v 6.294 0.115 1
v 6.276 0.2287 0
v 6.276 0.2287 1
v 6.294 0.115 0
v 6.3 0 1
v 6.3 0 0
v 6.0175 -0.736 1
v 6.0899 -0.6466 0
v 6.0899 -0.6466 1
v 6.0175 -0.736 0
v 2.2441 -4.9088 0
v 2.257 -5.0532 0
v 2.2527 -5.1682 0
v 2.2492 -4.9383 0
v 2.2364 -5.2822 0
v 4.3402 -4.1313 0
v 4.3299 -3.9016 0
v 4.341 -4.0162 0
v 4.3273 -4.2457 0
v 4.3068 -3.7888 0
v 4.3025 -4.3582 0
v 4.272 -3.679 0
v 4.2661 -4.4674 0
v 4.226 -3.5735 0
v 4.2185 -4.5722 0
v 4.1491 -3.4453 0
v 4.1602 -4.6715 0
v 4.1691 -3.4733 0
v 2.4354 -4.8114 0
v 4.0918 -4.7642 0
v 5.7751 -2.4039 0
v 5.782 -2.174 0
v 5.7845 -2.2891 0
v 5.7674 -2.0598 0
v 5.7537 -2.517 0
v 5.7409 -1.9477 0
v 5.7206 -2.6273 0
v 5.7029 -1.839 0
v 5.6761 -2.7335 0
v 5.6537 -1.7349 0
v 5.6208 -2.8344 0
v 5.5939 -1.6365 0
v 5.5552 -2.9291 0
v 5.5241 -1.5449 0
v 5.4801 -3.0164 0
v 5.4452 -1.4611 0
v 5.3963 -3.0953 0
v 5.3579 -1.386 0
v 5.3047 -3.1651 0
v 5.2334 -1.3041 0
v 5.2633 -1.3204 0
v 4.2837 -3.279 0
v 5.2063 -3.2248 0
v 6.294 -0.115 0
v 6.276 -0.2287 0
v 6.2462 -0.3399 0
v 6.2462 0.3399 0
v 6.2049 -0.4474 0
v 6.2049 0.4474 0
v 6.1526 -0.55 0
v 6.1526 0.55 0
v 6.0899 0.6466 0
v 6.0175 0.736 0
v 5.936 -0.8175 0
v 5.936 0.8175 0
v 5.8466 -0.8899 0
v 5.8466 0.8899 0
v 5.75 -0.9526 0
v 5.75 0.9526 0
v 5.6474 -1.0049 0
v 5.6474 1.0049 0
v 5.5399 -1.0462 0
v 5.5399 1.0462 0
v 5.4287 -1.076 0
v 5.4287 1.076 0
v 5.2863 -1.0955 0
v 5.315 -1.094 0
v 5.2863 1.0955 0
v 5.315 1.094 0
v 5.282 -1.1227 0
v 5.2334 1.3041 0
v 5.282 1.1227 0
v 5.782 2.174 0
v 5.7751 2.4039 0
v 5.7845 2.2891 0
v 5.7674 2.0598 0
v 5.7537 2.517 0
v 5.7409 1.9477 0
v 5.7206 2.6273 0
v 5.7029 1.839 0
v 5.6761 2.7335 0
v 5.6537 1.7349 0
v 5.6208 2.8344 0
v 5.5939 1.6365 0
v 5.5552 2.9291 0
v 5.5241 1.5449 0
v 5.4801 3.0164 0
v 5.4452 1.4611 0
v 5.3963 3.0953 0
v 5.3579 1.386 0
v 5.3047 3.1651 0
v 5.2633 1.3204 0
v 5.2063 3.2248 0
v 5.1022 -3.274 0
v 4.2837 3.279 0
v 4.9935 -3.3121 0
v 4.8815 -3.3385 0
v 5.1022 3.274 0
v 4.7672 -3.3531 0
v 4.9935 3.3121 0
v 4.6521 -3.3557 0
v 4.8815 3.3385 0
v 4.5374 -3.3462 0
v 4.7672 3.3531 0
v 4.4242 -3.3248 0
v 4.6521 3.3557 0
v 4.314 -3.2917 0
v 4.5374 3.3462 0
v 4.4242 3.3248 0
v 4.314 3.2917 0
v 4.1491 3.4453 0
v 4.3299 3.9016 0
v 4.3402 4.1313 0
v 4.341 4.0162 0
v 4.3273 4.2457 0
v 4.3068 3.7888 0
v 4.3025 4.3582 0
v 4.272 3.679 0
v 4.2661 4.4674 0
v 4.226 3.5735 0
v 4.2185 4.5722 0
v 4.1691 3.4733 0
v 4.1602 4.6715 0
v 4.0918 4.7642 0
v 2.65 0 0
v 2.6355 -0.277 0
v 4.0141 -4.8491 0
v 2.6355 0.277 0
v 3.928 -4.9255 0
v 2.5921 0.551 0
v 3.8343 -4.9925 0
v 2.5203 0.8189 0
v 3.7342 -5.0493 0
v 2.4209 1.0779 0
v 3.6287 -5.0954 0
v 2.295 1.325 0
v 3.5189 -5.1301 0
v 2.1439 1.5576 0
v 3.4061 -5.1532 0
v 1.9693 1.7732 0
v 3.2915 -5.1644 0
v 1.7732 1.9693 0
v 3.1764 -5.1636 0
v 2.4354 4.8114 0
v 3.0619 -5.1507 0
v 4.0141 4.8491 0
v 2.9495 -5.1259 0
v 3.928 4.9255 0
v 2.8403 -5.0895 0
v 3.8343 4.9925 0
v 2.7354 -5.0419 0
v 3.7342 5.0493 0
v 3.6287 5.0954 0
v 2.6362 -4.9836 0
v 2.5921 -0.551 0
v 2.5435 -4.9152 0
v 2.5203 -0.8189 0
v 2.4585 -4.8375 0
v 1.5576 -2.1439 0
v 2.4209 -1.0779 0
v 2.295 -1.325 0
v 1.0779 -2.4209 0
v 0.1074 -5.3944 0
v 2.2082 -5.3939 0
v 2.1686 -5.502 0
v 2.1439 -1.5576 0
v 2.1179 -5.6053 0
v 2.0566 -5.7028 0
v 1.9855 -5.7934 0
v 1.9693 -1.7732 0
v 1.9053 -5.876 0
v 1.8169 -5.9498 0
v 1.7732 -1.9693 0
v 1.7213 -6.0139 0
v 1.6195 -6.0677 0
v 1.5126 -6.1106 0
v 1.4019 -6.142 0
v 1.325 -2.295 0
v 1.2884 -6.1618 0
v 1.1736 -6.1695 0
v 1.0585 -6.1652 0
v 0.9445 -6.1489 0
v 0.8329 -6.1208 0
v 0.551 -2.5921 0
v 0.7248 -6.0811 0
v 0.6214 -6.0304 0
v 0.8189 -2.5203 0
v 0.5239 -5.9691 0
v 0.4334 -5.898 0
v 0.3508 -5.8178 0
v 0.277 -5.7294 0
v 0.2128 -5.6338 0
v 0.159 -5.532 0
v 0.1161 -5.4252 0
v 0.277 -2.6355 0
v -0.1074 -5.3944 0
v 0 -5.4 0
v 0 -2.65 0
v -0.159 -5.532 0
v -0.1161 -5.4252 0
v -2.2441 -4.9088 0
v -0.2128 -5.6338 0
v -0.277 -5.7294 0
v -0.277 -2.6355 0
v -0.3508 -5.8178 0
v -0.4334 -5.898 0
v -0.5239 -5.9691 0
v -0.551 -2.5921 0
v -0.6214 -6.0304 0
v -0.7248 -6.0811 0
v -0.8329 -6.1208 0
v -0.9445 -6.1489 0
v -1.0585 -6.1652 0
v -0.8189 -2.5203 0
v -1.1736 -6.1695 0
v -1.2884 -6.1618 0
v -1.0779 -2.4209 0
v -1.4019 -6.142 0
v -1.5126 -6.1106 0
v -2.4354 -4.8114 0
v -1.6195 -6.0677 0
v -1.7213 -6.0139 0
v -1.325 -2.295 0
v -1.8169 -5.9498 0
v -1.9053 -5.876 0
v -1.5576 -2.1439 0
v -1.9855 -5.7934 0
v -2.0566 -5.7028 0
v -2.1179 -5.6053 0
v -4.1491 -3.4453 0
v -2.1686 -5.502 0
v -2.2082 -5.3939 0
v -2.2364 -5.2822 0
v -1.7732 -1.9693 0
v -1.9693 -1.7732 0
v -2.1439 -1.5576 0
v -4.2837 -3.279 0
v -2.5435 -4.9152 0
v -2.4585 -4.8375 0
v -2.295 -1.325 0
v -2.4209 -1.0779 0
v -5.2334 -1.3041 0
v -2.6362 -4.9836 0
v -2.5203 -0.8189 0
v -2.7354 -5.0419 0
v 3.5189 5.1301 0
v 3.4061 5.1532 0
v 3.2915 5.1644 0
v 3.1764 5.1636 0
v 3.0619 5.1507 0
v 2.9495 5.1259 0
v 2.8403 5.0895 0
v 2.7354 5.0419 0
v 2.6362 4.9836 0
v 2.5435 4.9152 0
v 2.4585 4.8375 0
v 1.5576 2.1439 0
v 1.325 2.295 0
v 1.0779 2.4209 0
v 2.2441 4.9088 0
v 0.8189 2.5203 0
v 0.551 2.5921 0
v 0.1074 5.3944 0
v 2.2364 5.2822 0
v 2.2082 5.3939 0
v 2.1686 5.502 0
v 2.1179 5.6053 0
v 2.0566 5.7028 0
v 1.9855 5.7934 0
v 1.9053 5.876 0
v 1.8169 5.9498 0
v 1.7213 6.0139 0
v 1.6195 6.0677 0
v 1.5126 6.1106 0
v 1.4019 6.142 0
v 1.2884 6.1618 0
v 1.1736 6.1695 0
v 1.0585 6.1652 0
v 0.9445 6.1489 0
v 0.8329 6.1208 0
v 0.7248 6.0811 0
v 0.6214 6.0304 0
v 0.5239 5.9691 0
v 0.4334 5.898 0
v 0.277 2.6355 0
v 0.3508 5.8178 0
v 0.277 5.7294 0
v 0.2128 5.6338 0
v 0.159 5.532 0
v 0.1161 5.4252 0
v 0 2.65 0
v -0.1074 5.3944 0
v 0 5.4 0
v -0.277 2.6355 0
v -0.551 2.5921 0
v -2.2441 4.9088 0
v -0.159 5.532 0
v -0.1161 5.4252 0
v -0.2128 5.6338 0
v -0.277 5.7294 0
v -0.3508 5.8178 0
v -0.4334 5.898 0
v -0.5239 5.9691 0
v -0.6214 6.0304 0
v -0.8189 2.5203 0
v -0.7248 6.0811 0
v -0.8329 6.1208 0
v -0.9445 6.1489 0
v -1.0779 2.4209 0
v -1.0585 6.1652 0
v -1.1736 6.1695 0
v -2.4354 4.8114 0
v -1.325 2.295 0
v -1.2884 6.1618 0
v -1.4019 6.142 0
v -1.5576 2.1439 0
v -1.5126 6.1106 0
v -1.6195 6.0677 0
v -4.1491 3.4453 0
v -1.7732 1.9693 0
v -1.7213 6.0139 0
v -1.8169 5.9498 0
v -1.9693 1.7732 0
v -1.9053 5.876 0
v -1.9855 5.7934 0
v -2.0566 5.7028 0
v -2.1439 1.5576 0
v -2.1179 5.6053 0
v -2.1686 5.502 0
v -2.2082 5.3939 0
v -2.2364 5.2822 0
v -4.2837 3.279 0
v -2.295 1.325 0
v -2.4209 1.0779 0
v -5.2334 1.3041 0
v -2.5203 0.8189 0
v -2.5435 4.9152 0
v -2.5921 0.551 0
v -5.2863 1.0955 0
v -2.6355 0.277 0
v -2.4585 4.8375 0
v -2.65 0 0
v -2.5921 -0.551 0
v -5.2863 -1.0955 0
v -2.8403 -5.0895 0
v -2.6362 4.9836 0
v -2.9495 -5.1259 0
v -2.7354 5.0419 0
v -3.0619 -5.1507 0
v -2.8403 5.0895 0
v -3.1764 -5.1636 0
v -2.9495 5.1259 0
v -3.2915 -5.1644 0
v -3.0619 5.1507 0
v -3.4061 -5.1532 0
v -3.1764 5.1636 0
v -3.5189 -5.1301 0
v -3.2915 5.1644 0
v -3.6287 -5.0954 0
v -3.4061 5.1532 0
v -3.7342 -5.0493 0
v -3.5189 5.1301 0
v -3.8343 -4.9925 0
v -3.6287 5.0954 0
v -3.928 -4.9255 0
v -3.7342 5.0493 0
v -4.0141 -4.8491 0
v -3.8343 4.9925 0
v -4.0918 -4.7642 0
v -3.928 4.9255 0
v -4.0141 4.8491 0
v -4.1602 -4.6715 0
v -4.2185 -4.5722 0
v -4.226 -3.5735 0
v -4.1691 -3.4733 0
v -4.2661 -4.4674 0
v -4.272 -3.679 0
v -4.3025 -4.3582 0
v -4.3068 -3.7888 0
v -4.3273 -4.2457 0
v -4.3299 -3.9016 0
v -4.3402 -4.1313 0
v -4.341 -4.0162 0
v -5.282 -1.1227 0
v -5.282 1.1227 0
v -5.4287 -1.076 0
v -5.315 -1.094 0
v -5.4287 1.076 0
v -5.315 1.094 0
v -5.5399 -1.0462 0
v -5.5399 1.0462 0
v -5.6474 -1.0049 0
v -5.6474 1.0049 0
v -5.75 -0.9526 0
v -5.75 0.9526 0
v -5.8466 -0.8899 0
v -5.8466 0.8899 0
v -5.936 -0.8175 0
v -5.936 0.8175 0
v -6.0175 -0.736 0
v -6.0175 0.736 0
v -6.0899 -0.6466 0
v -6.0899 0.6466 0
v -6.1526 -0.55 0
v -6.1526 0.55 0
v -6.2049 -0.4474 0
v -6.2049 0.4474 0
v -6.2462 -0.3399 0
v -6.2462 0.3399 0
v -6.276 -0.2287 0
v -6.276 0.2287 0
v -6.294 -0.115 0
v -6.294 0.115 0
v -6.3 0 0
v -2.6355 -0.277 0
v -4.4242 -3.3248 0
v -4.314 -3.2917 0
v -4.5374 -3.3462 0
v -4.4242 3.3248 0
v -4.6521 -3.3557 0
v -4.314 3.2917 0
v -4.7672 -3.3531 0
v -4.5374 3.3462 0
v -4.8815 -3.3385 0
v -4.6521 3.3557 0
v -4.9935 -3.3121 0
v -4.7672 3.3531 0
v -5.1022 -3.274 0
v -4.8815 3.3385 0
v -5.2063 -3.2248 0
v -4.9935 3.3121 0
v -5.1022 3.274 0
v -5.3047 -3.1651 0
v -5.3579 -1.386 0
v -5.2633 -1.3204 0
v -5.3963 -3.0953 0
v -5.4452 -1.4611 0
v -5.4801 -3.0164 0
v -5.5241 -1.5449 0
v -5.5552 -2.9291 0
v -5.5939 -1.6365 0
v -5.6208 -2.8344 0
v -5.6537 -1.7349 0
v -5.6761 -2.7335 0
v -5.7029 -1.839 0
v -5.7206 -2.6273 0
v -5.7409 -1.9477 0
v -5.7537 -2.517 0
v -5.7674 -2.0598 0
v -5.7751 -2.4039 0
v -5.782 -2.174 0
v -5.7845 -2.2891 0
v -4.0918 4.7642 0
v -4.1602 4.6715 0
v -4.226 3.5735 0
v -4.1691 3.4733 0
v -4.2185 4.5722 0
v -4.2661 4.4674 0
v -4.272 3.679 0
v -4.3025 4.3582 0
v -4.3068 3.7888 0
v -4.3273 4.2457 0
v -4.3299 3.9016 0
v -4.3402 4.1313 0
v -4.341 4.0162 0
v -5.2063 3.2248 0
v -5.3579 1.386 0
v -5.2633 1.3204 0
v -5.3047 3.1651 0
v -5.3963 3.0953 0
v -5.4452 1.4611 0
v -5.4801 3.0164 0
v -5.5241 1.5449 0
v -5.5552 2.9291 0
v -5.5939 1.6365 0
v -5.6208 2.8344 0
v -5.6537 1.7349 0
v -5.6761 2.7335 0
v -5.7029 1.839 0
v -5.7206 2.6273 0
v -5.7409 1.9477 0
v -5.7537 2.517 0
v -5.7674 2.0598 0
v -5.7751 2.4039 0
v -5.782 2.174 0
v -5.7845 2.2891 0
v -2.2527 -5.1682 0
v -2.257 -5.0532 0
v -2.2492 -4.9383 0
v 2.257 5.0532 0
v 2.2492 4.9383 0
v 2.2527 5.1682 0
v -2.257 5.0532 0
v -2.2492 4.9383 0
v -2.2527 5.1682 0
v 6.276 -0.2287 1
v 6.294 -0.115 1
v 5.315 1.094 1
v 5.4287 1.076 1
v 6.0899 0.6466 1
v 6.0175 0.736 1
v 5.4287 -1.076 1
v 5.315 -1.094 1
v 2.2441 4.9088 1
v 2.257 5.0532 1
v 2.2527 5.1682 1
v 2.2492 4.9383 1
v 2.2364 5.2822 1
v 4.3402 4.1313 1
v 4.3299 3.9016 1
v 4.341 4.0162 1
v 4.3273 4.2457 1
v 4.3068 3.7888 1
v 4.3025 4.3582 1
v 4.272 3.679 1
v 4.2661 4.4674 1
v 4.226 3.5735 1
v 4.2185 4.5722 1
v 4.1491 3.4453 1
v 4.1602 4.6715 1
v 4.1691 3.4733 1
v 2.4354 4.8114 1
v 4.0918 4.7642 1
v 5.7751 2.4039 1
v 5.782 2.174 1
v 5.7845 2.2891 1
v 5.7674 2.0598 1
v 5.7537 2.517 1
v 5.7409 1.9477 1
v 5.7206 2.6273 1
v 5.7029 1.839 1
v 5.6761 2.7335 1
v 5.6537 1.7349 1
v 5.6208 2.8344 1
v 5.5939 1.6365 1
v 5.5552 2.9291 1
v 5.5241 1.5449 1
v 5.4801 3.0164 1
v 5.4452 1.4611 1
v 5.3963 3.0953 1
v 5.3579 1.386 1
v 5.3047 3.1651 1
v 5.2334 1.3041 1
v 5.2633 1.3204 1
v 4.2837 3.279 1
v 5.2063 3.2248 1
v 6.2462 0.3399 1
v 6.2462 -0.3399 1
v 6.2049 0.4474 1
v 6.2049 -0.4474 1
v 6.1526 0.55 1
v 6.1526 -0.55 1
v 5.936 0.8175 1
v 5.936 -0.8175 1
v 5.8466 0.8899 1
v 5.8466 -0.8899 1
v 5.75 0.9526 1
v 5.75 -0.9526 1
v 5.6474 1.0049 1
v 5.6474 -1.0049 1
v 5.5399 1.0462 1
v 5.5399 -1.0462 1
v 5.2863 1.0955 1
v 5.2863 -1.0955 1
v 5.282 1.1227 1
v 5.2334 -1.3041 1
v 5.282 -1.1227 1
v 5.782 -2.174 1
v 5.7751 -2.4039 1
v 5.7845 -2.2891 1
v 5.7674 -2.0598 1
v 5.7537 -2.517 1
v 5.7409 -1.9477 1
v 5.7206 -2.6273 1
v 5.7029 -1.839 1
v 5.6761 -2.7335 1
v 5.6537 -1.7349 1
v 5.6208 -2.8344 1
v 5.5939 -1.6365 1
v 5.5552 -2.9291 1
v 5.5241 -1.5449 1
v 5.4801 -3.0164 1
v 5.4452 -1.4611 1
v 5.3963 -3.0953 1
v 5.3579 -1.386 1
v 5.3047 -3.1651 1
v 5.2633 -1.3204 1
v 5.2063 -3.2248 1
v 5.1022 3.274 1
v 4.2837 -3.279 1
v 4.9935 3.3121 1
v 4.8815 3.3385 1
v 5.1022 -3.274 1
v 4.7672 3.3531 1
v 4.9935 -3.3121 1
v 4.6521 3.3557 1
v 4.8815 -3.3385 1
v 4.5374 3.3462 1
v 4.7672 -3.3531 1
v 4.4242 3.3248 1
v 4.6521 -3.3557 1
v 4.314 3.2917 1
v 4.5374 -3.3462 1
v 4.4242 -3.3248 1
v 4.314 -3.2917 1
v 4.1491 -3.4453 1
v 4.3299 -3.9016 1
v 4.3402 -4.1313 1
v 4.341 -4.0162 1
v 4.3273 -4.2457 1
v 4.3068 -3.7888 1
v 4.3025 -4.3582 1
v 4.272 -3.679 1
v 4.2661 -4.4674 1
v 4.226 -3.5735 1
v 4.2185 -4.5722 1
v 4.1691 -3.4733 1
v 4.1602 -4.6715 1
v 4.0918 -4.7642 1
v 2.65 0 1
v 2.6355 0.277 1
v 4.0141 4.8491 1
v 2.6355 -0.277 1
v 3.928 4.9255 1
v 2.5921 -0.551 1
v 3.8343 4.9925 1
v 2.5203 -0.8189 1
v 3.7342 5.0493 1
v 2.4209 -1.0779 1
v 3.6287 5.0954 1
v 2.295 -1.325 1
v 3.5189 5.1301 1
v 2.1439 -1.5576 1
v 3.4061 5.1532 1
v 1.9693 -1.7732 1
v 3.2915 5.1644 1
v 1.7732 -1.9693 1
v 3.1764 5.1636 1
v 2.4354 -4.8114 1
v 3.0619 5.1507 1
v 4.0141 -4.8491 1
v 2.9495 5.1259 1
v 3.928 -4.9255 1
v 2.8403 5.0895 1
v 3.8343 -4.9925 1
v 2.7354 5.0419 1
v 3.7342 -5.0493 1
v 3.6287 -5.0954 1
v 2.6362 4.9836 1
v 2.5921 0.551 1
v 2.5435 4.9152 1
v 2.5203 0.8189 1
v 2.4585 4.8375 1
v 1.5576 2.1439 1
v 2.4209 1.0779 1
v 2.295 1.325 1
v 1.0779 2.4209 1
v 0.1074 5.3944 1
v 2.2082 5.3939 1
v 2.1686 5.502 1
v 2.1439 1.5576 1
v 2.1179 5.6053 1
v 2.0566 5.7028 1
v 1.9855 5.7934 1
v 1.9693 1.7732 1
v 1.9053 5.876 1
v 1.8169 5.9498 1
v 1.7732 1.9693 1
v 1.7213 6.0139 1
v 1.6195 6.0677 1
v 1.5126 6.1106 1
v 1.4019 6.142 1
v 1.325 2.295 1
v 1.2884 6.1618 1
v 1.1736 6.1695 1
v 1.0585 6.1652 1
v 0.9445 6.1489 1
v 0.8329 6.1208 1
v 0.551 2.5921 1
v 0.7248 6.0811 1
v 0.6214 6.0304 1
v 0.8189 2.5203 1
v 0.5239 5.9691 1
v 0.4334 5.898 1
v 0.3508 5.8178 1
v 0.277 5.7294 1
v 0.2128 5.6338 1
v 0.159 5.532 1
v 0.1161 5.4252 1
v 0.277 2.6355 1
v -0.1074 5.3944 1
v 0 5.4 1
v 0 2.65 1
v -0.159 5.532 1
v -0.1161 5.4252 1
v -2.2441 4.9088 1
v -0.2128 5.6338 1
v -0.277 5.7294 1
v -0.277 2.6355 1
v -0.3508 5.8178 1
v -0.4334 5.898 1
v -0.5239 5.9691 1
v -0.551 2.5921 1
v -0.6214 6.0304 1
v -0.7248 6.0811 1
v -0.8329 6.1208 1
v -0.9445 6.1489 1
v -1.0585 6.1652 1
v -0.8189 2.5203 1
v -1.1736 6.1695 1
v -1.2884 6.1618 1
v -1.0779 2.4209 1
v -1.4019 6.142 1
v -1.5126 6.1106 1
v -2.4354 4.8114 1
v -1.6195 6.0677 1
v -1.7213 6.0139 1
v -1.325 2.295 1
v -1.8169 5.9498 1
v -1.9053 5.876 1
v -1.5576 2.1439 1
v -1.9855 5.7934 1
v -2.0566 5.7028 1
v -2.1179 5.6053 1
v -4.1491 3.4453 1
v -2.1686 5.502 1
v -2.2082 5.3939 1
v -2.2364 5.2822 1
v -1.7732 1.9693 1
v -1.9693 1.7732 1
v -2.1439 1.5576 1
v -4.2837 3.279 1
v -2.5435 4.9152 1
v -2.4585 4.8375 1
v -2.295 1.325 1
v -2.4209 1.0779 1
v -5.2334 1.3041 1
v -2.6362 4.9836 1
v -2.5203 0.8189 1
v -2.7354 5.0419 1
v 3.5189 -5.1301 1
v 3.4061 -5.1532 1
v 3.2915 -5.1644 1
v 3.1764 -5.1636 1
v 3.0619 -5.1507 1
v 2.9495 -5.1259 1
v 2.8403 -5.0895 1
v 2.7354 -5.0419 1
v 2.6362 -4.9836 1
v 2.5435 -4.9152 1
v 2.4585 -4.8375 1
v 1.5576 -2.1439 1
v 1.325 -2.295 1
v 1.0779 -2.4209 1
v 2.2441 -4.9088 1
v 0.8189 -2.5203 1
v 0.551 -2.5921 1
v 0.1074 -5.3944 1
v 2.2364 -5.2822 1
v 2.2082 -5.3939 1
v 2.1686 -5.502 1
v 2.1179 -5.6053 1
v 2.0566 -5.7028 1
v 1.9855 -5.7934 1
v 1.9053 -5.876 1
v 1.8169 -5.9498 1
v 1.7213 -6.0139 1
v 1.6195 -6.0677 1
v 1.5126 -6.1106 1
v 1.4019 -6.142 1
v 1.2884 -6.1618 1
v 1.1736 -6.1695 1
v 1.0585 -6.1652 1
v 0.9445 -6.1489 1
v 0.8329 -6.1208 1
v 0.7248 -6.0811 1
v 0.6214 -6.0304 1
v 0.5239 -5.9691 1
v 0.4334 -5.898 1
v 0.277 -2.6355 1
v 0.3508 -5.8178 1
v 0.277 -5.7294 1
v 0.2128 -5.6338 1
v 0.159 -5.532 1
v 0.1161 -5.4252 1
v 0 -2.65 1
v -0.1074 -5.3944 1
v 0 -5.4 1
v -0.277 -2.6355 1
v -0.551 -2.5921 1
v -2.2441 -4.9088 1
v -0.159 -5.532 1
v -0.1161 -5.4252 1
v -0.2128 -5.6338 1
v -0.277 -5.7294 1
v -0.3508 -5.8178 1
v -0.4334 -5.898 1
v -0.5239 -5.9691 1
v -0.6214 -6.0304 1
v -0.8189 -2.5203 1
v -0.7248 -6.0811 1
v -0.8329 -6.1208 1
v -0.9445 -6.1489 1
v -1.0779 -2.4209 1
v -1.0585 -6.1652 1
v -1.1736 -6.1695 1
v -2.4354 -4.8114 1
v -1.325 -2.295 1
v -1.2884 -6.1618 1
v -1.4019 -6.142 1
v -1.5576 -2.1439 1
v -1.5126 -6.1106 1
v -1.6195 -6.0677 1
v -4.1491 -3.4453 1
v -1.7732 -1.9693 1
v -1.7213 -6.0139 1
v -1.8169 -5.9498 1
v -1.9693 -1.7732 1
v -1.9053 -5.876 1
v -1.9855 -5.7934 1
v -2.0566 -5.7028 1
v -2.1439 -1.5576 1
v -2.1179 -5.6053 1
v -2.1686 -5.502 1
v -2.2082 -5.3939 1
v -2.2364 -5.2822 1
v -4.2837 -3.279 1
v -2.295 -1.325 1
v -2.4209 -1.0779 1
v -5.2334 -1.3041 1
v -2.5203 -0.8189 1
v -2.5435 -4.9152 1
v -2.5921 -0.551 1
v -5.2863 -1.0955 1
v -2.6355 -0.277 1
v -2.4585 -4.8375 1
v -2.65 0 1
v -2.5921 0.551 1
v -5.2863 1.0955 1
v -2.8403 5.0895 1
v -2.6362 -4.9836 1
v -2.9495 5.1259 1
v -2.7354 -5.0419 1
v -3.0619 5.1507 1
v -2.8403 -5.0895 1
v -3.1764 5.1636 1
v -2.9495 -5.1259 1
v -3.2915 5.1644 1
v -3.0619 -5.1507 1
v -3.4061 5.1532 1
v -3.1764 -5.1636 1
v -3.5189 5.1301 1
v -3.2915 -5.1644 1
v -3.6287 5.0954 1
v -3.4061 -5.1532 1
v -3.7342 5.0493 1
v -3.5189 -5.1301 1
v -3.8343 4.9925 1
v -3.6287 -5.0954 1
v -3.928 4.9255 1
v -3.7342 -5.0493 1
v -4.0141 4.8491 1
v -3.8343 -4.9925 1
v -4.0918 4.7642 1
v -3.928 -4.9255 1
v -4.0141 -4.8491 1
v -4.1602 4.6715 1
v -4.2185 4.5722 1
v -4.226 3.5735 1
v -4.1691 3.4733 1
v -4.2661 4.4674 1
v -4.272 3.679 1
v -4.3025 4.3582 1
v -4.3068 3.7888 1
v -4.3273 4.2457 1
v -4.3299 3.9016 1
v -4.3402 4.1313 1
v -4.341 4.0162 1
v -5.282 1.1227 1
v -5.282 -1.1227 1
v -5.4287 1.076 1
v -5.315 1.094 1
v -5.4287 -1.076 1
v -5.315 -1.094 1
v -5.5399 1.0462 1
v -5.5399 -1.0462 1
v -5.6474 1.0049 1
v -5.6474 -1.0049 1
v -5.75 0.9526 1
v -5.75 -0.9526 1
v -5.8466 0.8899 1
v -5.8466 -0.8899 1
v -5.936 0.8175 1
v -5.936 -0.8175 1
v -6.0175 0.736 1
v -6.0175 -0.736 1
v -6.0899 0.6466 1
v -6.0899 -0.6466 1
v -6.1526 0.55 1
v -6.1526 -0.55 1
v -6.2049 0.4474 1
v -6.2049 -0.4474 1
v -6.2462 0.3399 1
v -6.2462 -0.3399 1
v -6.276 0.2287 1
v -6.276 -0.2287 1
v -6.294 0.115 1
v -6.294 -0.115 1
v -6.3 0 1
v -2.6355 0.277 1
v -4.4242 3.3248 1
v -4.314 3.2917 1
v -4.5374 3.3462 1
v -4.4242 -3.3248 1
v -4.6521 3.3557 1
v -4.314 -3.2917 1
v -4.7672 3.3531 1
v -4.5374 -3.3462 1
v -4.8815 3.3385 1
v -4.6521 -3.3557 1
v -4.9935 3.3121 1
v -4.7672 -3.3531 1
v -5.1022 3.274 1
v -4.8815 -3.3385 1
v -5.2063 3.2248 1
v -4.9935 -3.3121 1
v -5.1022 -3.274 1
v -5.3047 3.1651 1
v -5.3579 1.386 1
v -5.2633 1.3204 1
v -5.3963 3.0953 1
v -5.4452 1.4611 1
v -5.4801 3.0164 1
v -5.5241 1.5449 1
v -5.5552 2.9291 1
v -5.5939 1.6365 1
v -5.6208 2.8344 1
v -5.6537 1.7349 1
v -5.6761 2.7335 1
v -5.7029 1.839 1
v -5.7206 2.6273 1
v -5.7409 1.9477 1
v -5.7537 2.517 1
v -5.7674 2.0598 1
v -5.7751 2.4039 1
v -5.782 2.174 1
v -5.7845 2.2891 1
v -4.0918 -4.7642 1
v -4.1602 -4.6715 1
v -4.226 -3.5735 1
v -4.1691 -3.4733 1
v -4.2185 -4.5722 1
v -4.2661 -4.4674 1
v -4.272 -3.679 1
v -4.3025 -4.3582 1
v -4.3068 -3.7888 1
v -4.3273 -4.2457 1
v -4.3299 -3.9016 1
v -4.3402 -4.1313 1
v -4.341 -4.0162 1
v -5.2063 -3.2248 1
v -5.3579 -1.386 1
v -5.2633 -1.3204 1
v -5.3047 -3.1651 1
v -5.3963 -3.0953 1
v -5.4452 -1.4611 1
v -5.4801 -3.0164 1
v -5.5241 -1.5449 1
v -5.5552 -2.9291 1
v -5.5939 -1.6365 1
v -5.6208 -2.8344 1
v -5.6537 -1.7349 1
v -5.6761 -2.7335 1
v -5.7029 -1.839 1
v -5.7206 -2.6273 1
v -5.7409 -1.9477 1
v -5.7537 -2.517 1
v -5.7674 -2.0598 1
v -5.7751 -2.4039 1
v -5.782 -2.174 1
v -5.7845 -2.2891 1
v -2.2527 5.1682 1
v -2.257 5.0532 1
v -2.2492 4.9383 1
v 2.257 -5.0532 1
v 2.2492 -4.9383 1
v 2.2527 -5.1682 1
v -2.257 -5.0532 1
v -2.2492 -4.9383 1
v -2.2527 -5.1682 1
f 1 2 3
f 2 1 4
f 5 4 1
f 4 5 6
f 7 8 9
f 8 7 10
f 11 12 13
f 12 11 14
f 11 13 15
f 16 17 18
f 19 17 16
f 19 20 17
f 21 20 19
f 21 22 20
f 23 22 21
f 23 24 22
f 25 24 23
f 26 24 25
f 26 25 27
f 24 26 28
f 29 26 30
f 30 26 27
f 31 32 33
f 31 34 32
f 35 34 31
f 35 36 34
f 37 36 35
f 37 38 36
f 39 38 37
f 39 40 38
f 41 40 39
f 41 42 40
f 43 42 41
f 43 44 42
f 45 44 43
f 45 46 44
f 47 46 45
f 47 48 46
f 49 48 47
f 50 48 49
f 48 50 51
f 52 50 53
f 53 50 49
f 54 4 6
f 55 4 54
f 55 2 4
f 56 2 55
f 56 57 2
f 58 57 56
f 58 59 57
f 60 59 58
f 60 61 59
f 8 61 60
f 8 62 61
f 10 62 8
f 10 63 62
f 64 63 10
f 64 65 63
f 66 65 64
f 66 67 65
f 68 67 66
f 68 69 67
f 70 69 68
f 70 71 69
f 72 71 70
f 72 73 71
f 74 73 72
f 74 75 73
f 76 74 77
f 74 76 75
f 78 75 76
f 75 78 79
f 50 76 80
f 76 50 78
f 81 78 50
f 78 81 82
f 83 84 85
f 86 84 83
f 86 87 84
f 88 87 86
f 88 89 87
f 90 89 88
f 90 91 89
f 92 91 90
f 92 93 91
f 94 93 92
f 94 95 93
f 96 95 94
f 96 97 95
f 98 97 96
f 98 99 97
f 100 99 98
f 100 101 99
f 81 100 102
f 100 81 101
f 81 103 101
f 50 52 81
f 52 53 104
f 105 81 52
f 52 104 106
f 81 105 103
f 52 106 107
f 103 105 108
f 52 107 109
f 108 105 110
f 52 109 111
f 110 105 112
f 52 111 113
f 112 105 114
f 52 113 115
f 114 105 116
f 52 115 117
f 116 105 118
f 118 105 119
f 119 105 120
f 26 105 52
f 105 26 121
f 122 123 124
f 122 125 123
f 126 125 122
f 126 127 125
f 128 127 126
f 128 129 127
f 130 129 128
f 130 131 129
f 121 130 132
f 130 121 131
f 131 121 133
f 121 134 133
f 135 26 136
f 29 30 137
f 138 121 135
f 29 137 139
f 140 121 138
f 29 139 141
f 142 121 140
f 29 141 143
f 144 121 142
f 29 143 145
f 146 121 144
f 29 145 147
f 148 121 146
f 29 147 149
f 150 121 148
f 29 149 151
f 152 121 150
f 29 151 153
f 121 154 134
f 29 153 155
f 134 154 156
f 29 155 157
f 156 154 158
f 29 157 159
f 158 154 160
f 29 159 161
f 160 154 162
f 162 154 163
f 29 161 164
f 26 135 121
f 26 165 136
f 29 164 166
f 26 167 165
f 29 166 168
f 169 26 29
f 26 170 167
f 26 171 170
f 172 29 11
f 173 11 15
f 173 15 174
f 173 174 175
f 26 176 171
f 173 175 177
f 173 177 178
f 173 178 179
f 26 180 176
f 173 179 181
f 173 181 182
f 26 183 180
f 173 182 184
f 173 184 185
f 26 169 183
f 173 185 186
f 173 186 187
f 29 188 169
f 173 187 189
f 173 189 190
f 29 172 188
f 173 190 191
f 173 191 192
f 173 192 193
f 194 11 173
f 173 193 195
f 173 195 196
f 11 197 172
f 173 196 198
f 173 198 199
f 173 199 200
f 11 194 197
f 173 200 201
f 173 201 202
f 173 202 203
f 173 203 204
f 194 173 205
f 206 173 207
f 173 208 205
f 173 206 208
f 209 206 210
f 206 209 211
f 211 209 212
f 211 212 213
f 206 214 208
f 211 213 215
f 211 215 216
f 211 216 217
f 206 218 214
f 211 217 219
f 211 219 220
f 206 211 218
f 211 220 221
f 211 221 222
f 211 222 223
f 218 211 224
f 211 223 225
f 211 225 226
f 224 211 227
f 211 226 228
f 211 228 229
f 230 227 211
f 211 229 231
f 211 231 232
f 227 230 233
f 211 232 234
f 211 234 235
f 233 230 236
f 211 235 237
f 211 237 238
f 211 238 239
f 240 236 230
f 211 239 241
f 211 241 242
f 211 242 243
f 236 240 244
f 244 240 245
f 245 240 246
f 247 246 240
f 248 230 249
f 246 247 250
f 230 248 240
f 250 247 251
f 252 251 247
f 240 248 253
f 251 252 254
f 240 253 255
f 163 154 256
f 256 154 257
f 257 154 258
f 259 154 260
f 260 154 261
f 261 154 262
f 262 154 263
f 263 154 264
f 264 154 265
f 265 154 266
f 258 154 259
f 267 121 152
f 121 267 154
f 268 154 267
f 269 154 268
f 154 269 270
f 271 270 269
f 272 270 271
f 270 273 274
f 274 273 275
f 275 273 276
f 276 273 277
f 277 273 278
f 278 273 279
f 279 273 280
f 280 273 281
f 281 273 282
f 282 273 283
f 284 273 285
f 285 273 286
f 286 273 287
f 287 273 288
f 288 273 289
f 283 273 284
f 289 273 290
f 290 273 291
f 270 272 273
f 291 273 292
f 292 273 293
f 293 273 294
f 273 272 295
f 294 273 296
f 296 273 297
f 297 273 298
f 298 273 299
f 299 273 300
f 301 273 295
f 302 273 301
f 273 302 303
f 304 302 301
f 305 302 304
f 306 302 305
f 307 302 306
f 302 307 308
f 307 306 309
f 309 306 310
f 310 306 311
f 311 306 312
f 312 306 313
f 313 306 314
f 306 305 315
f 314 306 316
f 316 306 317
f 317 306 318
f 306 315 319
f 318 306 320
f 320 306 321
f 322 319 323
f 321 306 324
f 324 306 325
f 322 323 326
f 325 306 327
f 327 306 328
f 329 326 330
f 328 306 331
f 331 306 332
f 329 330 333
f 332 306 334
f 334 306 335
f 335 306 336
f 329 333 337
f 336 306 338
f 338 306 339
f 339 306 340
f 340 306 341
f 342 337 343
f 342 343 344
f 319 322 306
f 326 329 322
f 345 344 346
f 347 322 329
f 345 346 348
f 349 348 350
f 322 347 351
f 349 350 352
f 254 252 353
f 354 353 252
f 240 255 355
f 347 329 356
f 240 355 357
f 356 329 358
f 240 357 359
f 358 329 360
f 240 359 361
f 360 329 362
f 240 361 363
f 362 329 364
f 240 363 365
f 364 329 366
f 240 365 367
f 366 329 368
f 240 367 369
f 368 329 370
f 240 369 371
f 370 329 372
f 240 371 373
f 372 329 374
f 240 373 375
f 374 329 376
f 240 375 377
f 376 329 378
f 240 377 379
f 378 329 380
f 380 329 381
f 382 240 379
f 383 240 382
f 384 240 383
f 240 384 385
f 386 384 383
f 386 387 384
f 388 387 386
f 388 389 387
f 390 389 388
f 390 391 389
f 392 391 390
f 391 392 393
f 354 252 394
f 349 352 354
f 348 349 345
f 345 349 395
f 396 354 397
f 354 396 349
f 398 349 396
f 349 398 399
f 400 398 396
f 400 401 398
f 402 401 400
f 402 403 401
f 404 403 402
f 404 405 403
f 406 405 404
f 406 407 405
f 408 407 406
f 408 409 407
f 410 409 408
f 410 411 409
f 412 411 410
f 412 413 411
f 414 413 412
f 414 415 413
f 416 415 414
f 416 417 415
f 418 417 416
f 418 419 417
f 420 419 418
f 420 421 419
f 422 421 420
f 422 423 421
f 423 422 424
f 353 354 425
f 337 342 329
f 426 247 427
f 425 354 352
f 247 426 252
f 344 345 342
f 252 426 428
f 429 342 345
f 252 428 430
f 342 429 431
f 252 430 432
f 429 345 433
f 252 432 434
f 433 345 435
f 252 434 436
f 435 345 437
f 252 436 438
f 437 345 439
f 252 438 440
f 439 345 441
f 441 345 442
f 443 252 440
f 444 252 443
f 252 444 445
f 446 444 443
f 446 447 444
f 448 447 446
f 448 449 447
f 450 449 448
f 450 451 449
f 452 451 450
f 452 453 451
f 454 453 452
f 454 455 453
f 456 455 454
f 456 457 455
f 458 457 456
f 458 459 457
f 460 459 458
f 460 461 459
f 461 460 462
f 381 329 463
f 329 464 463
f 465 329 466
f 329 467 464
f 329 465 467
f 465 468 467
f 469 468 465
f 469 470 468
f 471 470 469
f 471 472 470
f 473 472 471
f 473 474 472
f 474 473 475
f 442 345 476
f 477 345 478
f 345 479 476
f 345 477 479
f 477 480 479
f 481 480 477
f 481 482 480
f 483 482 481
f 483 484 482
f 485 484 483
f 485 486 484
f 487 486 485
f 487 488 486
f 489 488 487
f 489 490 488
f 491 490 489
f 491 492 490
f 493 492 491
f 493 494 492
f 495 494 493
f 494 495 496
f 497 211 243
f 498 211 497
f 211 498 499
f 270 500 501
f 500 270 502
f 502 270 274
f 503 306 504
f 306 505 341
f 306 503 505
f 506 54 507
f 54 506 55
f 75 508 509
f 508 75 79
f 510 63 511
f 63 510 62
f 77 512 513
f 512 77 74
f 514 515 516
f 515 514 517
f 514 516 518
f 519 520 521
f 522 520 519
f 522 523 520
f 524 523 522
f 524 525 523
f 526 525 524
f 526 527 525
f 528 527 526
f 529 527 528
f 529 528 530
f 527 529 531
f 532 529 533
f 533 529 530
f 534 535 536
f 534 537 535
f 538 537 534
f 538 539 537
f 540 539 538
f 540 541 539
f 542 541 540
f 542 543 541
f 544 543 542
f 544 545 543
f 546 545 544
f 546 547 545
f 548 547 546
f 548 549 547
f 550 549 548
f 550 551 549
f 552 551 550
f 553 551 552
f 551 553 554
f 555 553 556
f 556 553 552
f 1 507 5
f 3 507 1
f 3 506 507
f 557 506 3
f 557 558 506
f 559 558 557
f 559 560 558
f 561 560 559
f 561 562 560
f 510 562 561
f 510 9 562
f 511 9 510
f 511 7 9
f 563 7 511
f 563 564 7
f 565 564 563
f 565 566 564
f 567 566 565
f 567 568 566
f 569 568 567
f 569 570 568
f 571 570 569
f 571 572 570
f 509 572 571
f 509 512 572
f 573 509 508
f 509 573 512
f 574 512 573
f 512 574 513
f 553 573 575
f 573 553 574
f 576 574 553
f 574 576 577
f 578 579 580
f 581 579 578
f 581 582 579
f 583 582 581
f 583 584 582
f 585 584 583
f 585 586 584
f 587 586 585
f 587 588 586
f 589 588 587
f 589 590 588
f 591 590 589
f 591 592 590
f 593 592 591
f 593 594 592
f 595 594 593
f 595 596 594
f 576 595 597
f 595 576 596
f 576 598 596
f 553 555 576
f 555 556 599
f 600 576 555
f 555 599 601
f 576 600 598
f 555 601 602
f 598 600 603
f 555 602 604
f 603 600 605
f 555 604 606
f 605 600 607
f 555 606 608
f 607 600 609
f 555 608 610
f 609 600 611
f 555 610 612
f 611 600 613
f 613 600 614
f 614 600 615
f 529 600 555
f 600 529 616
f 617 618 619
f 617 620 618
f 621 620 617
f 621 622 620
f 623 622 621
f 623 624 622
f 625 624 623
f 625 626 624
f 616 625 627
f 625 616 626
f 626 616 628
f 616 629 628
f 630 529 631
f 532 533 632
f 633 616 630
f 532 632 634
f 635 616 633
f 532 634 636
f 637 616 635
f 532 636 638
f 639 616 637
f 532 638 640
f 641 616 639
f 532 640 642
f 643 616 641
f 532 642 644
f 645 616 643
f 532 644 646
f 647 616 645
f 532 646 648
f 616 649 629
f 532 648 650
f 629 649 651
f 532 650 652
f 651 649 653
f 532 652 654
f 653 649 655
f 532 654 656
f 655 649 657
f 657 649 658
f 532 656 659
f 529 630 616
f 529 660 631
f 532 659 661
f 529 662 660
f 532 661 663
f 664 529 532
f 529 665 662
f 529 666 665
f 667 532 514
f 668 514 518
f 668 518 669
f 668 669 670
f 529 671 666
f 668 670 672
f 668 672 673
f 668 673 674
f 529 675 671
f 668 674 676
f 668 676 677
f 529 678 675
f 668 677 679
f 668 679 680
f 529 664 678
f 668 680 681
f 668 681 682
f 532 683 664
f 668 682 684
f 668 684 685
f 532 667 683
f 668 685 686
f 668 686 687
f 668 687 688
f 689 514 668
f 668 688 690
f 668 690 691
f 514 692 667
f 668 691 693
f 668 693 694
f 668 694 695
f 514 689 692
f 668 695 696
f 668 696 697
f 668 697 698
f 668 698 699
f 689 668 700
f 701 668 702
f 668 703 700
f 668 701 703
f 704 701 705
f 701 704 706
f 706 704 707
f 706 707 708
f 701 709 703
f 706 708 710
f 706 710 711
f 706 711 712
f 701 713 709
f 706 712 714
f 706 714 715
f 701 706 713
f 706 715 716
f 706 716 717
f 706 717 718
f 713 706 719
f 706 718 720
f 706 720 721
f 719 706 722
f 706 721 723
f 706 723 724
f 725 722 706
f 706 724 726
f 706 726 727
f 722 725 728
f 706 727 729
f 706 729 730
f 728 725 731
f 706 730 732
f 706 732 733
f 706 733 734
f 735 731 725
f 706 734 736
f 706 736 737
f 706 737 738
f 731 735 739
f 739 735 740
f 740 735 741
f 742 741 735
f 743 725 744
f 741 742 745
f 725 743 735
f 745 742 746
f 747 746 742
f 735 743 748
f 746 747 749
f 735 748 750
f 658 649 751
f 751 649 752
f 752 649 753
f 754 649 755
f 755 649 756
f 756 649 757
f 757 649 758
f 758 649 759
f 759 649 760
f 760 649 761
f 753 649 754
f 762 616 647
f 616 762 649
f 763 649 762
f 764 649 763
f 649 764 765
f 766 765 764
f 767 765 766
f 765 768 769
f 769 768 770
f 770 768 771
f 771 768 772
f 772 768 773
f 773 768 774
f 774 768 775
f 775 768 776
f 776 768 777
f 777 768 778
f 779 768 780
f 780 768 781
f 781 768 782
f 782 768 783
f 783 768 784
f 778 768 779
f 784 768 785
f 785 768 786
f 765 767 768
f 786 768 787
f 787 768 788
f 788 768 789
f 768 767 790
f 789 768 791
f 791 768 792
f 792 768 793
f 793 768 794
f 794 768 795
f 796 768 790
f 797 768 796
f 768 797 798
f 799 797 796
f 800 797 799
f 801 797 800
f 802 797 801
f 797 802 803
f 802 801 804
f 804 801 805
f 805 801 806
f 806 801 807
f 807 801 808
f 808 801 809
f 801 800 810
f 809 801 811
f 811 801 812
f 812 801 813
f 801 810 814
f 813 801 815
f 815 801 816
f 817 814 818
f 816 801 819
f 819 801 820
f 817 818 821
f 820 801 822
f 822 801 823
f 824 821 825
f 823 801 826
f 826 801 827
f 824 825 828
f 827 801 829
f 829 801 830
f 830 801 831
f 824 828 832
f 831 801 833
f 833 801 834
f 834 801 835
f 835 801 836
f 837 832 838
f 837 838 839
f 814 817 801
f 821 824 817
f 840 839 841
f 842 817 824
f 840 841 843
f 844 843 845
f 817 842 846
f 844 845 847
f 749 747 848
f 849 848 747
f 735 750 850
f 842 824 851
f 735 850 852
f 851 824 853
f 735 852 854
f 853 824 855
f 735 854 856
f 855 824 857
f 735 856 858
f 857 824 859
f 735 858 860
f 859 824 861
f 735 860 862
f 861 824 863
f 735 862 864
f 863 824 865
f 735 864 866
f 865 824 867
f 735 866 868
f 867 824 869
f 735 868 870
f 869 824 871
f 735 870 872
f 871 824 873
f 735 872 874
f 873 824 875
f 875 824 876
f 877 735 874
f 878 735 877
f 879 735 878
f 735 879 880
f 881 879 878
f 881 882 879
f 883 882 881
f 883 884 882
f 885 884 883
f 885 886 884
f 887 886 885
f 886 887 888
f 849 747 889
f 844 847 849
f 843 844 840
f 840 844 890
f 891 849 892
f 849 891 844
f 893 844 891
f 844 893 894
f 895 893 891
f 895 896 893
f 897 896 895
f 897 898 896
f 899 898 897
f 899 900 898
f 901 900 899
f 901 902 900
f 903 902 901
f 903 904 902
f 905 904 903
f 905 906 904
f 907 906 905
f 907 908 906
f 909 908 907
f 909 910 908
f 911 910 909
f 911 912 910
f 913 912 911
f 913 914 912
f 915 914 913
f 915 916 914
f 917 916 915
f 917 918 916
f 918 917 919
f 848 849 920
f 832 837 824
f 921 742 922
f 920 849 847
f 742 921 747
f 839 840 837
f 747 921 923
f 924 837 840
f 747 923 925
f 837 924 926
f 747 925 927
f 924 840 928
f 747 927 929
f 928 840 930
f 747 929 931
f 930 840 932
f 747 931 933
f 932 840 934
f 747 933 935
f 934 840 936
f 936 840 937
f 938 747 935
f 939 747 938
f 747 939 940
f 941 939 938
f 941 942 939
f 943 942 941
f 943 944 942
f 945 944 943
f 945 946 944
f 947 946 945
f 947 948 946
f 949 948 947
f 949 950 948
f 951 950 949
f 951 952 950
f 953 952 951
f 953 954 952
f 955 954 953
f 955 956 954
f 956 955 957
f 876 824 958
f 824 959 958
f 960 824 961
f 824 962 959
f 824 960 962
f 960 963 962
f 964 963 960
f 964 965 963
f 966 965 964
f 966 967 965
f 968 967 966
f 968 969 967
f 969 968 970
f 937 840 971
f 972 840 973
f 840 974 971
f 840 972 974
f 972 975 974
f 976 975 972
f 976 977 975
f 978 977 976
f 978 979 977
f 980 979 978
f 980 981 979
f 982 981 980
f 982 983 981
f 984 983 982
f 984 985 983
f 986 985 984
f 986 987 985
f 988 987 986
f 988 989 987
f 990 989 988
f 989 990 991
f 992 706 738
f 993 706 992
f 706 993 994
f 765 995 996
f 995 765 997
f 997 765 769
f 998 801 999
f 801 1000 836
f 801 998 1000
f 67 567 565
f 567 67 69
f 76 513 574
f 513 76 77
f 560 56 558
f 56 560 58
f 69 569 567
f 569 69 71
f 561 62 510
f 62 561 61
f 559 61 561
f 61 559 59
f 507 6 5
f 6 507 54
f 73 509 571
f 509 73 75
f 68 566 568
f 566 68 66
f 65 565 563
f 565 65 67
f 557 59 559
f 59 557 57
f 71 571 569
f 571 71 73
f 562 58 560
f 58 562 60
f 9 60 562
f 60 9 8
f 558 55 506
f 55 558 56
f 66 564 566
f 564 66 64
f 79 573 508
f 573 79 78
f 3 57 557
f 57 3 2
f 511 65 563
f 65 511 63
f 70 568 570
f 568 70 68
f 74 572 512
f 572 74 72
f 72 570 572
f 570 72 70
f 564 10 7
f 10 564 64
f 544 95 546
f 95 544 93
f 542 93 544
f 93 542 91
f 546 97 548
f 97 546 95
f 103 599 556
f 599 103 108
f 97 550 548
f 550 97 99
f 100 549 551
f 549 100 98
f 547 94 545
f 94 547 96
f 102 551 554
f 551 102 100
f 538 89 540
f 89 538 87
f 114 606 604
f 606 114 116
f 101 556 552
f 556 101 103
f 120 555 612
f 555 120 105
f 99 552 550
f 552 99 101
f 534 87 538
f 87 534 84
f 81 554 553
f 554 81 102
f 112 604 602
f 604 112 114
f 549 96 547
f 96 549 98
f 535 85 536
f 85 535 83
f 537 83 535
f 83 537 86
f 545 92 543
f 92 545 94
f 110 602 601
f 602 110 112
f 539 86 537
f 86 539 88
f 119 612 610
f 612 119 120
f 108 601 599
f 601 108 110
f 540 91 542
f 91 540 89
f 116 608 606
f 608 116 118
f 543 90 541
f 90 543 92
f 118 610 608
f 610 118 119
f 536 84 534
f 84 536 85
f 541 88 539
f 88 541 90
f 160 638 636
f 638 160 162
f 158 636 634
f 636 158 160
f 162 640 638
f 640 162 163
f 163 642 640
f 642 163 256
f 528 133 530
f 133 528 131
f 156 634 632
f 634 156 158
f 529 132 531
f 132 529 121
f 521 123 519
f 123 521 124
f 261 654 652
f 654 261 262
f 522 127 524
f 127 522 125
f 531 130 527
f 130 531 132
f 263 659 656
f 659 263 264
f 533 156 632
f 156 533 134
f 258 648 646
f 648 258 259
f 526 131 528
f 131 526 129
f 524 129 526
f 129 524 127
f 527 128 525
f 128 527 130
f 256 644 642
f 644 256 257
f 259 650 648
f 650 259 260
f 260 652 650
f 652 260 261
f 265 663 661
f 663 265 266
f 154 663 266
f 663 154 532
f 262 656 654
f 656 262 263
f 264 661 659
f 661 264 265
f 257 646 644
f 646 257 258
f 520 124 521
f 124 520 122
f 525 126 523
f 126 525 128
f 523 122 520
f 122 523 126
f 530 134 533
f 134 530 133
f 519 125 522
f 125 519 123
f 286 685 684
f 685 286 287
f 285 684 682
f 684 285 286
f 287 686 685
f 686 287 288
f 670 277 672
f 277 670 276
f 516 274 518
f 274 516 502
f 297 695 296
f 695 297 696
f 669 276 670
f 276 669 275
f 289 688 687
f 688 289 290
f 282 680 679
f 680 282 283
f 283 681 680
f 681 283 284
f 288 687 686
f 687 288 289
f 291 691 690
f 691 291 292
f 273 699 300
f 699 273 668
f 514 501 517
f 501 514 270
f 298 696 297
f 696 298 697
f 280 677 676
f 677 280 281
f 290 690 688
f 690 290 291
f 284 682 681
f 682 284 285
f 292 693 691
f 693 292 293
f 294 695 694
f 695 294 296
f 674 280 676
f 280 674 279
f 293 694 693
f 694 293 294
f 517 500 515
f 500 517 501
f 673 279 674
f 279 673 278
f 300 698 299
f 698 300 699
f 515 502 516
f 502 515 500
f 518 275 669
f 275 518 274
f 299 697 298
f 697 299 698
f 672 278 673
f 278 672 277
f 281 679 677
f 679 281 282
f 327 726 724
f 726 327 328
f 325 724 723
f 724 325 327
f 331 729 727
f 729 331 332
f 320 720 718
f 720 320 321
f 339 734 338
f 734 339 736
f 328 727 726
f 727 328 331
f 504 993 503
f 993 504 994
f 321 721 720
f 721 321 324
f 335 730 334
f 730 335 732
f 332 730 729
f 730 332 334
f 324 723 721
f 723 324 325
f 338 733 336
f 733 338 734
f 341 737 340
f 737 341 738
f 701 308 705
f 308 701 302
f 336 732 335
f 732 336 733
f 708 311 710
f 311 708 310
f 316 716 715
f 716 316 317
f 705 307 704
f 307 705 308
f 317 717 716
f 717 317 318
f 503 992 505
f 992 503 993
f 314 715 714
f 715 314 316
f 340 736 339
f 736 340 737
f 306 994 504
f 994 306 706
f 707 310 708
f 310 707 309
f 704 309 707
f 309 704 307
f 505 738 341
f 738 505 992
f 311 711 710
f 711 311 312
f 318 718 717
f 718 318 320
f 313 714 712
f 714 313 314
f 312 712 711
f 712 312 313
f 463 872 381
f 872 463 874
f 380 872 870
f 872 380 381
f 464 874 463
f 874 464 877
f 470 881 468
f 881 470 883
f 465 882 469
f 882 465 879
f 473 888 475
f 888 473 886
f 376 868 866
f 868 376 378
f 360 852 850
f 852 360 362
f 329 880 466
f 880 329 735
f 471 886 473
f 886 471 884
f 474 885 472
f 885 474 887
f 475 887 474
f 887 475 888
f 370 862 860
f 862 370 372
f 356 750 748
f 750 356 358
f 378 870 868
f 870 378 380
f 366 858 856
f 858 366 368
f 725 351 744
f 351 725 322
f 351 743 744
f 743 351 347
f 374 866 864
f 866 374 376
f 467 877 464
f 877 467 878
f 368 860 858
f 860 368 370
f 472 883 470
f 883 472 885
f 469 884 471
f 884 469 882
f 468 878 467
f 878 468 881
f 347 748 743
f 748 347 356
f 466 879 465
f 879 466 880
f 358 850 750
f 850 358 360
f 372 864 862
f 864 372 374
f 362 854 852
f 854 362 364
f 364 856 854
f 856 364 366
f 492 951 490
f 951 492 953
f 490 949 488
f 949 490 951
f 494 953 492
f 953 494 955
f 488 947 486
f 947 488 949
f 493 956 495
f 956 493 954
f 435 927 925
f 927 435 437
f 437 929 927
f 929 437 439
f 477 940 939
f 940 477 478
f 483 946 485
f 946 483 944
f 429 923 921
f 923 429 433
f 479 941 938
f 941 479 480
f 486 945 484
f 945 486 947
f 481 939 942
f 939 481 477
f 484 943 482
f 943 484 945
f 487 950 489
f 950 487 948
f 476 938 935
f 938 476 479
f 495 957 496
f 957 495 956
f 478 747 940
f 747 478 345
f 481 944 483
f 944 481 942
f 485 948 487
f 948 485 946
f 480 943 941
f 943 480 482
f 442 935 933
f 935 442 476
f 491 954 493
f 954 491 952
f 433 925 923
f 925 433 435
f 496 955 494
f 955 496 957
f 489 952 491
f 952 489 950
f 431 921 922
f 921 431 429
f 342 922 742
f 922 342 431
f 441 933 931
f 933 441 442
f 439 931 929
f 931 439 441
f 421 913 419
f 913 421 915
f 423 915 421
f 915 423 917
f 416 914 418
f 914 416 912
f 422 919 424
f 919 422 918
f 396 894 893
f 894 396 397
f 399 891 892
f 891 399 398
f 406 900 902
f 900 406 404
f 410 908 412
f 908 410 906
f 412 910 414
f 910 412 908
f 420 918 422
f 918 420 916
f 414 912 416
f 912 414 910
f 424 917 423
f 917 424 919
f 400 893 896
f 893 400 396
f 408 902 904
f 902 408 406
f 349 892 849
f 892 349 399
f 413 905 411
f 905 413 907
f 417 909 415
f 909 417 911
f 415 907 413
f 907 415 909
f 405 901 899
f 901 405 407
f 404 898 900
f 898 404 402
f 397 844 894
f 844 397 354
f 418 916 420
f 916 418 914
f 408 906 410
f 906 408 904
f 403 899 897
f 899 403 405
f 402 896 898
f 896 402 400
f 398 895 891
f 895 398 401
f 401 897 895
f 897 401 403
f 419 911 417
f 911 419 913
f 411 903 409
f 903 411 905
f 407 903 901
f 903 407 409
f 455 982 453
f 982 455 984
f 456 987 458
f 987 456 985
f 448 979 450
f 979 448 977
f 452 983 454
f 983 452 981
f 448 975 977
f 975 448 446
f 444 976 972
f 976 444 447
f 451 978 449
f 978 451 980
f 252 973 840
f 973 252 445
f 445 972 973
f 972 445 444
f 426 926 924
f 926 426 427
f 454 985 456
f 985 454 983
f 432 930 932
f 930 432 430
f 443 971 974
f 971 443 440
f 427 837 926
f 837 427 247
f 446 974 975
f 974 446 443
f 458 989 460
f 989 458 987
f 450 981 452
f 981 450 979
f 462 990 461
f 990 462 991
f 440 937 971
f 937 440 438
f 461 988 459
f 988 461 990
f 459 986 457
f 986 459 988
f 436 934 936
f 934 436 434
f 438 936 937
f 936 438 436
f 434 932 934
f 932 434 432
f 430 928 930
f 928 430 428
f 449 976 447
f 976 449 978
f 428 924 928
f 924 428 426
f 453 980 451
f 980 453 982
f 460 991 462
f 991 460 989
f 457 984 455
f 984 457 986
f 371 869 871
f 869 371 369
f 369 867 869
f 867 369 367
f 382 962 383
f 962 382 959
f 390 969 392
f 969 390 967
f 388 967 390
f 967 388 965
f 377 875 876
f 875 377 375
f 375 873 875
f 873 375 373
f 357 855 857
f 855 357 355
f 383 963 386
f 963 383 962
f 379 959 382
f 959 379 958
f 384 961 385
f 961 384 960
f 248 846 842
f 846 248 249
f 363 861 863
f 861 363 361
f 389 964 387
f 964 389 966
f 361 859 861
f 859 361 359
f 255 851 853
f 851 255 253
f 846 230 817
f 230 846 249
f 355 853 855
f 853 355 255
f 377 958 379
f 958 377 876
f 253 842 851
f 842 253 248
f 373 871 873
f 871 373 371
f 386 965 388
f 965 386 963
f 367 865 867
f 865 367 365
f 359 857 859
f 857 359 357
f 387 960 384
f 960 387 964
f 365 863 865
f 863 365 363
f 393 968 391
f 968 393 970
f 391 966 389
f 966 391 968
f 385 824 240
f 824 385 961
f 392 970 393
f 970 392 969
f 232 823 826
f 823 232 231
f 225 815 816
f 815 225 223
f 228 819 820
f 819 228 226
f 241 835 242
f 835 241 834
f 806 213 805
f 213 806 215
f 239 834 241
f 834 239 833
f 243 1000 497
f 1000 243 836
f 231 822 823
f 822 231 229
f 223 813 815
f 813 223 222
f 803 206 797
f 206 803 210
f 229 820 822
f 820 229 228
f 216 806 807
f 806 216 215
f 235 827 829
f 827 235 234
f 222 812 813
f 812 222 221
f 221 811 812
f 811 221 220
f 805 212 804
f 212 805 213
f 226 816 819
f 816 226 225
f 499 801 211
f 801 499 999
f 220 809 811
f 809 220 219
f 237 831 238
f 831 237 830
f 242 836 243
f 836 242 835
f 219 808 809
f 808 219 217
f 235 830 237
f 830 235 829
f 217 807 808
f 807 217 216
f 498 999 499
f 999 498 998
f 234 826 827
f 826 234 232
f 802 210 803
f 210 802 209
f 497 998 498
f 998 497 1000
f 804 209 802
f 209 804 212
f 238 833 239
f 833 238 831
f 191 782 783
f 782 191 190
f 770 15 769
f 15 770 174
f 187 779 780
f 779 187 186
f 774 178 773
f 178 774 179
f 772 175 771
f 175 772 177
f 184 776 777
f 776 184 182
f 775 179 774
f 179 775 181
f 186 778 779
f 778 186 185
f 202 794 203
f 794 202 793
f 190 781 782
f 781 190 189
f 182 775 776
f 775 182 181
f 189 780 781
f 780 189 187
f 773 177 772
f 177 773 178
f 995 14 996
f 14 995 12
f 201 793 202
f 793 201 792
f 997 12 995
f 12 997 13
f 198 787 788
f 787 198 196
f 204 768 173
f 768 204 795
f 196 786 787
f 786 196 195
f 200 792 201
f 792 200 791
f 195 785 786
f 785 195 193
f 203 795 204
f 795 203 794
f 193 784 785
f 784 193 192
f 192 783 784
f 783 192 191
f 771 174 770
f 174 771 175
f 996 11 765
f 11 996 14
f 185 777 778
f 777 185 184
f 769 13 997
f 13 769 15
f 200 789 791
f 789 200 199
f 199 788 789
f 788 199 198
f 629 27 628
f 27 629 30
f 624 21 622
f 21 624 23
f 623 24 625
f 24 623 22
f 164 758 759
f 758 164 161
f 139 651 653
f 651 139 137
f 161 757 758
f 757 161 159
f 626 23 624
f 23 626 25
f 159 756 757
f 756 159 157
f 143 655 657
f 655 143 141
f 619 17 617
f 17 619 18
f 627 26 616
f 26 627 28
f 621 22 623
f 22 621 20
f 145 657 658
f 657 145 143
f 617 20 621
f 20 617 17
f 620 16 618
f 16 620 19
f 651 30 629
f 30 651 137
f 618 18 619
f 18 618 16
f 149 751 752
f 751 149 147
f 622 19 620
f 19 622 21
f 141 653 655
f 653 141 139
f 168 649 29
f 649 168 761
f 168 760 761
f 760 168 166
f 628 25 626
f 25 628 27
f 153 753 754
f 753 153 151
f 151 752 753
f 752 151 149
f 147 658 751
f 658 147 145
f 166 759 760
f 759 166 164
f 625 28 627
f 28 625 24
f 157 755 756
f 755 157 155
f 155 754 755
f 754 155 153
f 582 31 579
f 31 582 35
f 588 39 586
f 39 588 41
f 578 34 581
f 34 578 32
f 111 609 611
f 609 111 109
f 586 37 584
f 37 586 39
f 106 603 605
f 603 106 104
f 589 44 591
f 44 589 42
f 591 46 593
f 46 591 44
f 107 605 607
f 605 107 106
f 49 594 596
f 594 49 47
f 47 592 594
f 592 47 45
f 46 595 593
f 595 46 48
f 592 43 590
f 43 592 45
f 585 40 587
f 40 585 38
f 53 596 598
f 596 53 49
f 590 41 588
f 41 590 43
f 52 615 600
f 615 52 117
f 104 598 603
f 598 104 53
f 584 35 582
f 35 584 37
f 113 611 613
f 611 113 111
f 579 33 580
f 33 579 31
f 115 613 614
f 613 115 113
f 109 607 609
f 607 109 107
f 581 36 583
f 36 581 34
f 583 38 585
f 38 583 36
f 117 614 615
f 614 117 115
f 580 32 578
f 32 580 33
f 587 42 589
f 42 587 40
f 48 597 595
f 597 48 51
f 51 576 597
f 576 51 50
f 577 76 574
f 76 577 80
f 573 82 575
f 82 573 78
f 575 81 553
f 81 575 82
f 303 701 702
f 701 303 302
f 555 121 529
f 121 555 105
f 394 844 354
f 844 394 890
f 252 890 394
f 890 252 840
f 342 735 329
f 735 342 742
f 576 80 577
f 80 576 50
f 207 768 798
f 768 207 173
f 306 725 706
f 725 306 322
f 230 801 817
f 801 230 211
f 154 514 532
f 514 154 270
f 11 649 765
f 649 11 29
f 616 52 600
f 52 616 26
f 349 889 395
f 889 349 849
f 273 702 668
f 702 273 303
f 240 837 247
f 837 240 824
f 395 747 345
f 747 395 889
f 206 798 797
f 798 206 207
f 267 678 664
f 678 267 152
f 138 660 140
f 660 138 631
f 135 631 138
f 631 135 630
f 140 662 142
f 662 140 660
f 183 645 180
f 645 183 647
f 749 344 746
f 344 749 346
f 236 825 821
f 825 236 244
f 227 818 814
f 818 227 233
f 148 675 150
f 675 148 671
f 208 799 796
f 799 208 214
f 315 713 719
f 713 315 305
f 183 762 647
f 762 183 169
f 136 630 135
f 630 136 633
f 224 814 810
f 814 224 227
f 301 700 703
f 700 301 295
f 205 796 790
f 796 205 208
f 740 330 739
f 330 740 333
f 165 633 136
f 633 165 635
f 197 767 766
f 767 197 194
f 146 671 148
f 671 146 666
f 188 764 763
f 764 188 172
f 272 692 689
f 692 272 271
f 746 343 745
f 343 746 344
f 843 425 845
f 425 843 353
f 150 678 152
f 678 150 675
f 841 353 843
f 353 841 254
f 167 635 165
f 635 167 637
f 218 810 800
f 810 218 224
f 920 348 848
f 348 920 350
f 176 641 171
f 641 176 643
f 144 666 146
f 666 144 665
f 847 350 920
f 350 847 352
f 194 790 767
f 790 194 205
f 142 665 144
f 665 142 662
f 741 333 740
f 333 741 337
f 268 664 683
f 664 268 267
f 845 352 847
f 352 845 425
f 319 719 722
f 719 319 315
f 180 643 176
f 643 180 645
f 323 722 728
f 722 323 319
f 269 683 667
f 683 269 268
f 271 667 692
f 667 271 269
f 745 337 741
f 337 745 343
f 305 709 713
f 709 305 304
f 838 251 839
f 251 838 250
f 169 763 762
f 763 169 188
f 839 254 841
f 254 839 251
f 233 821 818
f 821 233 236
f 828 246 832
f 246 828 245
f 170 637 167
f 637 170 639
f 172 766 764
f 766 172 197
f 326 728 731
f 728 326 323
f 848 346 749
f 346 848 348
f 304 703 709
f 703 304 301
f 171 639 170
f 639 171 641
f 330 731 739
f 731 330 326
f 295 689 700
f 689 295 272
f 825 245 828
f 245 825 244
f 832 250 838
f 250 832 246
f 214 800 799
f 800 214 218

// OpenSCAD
// External-serrated lock washer.
$fn = 60;
eps = 0.02;
inner_d = 5.3;
outer_d = 12;
thickness = 1;
teeth = 14;
difference() {
    union() {
        cylinder(d=outer_d-1.2,h=thickness);
        for(i=[0:teeth-1]) rotate([0,0,i*360/teeth]) translate([outer_d/2-0.8,0,0]) cylinder(d=2.2,h=thickness);
    }
    translate([0,0,-eps]) cylinder(d=inner_d,h=thickness+2*eps);
}
